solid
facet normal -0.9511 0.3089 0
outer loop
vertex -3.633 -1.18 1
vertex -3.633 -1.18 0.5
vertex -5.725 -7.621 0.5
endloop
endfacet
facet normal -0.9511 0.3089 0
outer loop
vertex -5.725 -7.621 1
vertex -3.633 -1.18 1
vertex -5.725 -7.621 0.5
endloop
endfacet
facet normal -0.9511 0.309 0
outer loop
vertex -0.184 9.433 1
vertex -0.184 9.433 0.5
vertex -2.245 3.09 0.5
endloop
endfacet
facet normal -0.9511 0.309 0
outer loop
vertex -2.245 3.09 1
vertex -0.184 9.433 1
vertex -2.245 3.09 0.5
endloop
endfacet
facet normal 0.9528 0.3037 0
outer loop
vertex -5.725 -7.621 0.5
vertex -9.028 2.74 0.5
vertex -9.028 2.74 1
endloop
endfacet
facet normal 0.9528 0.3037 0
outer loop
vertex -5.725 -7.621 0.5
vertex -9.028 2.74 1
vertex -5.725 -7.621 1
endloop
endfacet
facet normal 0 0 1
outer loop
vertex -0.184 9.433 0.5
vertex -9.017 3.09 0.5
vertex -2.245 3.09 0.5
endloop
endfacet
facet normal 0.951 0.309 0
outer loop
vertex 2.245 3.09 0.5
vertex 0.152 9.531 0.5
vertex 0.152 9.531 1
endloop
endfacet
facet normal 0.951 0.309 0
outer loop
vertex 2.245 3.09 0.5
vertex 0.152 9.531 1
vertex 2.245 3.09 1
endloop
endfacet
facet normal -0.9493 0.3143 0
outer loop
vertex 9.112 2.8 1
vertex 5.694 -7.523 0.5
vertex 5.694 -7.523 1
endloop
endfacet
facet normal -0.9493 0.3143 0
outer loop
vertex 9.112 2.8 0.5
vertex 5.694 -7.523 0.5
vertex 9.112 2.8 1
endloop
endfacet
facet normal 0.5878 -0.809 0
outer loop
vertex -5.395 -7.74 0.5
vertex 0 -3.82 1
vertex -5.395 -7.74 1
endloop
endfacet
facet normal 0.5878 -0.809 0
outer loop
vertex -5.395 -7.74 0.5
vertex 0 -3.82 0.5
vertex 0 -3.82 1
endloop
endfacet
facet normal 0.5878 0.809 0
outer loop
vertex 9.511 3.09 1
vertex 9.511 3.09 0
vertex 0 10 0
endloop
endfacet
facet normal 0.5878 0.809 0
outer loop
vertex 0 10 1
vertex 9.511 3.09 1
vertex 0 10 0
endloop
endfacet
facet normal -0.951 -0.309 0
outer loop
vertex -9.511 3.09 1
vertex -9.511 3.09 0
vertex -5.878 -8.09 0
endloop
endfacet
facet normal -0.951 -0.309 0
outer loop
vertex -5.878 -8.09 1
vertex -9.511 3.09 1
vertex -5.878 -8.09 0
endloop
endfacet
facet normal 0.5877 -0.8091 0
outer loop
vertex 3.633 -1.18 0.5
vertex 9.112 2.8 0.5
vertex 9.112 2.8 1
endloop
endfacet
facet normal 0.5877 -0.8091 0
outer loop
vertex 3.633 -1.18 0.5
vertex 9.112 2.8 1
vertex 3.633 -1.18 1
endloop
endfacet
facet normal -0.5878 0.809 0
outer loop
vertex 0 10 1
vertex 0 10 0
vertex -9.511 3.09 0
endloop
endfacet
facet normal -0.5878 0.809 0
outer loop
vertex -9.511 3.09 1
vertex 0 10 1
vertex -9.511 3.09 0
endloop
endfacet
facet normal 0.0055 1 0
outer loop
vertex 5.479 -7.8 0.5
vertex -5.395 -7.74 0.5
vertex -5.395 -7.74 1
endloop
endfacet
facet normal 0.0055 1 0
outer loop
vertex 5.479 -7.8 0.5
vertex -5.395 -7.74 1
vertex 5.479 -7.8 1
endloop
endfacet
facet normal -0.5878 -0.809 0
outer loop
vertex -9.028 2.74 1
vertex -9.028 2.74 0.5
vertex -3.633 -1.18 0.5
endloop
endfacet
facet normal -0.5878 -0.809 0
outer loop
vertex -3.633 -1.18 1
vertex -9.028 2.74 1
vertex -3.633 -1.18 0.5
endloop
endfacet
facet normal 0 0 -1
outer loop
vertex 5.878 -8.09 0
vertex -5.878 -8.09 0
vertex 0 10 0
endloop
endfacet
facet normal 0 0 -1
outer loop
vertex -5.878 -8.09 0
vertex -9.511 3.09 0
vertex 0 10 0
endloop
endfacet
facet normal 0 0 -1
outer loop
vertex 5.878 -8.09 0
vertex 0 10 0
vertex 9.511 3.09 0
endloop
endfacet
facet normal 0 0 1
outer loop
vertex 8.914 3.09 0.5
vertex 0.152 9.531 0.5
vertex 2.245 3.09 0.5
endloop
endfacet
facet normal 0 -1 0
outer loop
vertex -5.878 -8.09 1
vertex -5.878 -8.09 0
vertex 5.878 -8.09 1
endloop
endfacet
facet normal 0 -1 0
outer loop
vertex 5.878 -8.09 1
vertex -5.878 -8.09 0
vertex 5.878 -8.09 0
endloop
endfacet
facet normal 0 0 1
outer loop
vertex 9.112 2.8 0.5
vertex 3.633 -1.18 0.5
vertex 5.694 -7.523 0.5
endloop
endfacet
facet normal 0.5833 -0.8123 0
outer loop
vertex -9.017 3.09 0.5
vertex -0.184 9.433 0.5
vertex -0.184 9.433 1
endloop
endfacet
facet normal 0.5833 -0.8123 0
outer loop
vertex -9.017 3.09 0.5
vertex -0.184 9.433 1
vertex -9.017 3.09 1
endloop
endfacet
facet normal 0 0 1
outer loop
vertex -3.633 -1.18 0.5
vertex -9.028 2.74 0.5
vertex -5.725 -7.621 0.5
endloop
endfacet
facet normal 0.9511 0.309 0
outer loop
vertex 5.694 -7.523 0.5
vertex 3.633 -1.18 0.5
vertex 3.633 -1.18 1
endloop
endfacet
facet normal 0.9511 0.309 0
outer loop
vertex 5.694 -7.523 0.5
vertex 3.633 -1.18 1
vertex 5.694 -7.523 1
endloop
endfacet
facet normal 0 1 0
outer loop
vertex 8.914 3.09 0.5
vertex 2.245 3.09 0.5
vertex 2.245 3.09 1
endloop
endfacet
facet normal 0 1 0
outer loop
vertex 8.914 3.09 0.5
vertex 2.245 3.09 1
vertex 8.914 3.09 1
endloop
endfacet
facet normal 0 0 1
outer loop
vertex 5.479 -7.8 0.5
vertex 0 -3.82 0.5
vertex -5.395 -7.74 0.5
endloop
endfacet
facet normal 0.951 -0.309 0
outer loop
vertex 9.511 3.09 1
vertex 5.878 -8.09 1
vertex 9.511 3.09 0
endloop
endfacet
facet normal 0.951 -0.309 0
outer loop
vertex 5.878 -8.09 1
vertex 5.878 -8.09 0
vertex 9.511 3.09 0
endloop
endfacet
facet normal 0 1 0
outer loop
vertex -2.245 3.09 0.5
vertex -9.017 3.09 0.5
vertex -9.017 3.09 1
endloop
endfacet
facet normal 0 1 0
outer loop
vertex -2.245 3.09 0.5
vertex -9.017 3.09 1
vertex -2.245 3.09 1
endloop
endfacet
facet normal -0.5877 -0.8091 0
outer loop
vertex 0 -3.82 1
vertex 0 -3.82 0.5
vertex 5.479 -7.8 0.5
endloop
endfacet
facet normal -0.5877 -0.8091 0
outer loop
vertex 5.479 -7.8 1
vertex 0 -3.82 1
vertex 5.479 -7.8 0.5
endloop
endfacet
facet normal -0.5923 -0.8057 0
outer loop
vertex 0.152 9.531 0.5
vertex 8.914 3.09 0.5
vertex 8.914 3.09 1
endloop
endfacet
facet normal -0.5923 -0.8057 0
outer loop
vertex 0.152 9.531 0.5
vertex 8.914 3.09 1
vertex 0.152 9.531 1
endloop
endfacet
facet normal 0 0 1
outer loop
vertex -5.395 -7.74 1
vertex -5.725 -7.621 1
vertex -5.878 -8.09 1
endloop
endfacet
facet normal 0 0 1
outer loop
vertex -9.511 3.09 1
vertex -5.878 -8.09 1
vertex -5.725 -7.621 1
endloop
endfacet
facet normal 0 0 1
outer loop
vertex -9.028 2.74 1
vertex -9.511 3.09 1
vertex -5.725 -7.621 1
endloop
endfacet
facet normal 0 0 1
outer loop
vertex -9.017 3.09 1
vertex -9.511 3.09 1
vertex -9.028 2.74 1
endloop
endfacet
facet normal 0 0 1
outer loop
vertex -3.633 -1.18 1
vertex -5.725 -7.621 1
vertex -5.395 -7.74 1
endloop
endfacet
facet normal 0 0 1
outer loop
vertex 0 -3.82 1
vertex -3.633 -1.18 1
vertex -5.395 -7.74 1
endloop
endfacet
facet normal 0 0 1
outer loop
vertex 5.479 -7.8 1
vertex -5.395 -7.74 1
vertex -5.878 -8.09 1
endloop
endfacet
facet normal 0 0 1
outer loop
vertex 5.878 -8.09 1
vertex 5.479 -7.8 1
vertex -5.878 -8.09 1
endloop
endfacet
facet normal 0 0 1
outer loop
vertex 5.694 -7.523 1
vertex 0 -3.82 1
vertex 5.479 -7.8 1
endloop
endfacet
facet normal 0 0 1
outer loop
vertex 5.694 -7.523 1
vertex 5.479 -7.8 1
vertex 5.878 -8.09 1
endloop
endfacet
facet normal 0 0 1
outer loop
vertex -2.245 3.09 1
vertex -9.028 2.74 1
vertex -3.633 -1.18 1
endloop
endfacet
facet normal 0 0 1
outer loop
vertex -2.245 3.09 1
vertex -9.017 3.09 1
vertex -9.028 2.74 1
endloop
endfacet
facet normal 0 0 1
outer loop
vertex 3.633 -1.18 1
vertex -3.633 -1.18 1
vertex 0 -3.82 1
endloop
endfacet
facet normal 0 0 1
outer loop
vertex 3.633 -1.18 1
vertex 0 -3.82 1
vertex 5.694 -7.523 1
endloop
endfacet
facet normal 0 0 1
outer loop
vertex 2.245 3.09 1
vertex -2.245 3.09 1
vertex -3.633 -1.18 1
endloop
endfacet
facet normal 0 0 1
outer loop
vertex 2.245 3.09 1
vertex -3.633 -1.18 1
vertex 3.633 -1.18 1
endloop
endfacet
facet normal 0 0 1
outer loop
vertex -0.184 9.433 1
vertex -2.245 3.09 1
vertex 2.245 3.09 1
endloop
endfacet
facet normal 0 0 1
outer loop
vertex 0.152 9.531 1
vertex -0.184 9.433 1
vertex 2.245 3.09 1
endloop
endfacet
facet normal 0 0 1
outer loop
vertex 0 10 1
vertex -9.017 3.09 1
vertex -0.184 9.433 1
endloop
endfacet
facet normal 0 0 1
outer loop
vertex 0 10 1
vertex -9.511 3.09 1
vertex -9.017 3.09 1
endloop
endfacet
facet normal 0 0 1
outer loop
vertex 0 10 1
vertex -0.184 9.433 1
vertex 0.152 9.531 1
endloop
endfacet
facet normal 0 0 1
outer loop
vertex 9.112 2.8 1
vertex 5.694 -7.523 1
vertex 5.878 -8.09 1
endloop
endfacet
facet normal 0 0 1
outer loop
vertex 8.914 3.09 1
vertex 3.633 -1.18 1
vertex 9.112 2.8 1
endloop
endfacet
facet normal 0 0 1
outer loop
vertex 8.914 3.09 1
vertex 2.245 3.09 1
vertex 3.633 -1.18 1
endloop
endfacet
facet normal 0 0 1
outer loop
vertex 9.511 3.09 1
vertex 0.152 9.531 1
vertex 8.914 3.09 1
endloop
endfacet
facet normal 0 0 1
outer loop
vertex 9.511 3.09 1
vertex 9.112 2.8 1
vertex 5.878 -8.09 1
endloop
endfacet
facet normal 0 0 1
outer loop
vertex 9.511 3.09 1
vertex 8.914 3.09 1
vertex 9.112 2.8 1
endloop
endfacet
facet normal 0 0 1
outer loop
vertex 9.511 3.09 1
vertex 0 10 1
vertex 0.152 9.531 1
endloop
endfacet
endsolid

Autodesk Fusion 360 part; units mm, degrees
sketch "Boceto1" plane through (0, 0, 0) normal (0, 0, 1) x (1, 0, 0)
  line L0 (0, 10) -> (-9.5106, 3.0902)
  line L1 (-9.5106, 3.0902) -> (-5.8779, -8.0902)
  line L2 (-5.8779, -8.0902) -> (5.8779, -8.0902)
  line L3 (5.8779, -8.0902) -> (9.5106, 3.0902)
  line L4 (9.5106, 3.0902) -> (0, 10)
  line L5 (-9.0281, 2.7396) -> (-5.6882, -7.738)
  line L6 (-5.3954, -7.7396) -> (5.4788, -7.8003)
  line L7 (5.6936, -7.523) -> (9.1501, 2.9168)
  line L8 (8.9142, 3.0902) -> (0.1524, 9.5309)
  line L9 (-0.1843, 9.4328) -> (-9.0173, 3.0902)
  line L10 (-9.0173, 3.0902) -> (-2.2451, 3.0902)
  line L11 (2.2451, 3.0902) -> (8.9142, 3.0902)
  line L12 (-9.0281, 2.7396) -> (-3.6327, -1.1803)
  line L13 (0, -3.8197) -> (5.4788, -7.8003)
  line L14 (9.1115, 2.8003) -> (3.6327, -1.1803)
  line L15 (0, -3.8197) -> (-5.3954, -7.7396)
  line L16 (-0.1843, 9.4328) -> (-2.2451, 3.0902)
  line L17 (-3.6327, -1.1803) -> (-5.7254, -7.6211)
  line L18 (0.1524, 9.5309) -> (2.2451, 3.0902)
  line L19 (3.6327, -1.1803) -> (5.6936, -7.523)
extrude "Extruir1" add sketch "Boceto1" along normal blind 0.5 contours L5 L12 L17 | L6 L13 L15 | L7 L14 L19 | L8 L11 L18 | L9 L10 L16 makes body 1 at (0.0278, -6.4532, 0) makes body 2 at (-6.1287, -2.0206, 0) makes body 3 at (6.1459, -1.9677, 0) makes body 4 at (-3.8156, 5.2044, 0) makes body 5 at (3.7706, 5.2371, 0)
extrude "Extruir2" add sketch "Boceto1" along normal blind 1 bodies 1 2 3 4 5
